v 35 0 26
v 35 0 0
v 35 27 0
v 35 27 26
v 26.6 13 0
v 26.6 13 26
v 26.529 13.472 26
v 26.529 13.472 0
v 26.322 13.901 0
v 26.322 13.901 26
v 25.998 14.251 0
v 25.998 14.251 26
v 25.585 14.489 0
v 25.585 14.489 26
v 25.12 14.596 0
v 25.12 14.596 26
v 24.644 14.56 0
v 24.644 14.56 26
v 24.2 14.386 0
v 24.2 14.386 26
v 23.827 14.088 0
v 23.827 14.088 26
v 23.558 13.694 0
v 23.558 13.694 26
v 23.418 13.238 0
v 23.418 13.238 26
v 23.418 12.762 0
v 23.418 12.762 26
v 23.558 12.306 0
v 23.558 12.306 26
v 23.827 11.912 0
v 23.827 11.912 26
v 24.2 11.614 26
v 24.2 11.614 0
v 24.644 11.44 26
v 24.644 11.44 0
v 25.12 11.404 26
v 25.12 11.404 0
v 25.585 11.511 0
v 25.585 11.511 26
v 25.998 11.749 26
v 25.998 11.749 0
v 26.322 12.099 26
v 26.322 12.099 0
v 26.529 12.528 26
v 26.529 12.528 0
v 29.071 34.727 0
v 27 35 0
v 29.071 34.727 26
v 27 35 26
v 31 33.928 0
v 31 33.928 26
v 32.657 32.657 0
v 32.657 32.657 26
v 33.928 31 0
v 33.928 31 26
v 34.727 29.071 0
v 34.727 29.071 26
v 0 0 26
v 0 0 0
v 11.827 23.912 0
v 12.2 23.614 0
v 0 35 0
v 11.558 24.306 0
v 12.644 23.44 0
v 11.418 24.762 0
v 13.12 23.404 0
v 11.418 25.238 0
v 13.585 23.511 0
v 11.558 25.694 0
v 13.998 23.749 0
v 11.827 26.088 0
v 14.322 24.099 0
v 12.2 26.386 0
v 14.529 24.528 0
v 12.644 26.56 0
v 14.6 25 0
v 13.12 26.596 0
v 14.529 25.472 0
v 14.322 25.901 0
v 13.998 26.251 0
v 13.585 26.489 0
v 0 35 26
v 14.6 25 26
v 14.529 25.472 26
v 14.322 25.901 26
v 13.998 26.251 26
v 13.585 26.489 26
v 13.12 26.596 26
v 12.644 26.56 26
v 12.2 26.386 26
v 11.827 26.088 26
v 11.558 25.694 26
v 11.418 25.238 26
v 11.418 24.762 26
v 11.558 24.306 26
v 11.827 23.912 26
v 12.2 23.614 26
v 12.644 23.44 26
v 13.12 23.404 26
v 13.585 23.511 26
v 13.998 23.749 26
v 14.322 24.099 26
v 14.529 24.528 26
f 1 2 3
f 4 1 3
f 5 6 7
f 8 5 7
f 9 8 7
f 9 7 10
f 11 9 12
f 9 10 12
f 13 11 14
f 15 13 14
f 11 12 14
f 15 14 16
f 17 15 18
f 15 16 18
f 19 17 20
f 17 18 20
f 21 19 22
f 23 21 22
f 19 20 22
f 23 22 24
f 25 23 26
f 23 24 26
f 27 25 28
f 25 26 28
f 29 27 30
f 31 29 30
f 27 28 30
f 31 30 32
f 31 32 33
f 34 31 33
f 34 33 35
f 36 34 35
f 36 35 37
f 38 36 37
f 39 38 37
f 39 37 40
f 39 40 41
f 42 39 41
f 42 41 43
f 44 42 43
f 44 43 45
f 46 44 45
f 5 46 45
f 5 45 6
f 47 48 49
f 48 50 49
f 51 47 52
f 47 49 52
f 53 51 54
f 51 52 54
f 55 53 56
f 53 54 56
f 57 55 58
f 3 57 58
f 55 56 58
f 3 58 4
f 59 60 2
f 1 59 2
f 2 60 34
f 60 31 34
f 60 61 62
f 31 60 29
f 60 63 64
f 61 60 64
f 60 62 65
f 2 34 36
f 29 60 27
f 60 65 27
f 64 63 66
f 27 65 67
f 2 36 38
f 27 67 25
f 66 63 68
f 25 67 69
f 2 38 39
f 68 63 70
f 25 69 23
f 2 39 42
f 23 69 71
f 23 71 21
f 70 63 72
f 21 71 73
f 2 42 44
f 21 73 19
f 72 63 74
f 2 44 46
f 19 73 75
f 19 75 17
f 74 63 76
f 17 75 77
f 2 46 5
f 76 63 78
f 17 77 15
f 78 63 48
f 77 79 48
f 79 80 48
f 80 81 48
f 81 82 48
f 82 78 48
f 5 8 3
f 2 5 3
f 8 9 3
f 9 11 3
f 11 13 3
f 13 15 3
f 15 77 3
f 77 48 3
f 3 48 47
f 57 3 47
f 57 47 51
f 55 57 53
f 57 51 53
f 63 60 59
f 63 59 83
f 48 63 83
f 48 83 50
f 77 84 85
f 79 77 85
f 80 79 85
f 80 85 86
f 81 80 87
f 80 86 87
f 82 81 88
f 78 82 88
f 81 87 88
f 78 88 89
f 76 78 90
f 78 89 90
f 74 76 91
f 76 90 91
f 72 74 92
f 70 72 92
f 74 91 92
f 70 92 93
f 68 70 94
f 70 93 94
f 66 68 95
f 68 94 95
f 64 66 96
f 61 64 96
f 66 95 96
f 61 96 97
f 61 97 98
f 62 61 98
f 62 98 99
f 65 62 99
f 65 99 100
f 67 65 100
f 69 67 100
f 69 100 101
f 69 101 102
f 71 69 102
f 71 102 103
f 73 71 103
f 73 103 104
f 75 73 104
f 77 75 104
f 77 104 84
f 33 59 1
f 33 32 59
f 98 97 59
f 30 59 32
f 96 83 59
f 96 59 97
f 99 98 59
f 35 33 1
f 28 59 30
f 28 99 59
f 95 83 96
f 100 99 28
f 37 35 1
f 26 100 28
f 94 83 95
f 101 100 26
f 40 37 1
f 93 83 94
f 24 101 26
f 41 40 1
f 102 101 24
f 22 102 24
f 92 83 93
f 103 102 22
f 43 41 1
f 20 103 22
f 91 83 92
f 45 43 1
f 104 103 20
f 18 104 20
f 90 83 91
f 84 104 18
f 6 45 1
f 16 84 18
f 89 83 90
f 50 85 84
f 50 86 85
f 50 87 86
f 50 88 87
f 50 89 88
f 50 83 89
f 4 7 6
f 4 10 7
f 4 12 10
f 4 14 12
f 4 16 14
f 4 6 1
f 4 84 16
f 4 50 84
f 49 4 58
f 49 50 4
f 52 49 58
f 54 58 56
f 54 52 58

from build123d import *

# Parameters (mm, degrees)
SKETCH_W     = 35
SKETCH_H     = 35
PAD_DEPTH    = 26
SKETCH001_R  = 1.6
POCKET_DEPTH = 26.001
FILLET_R     = 8


with BuildPart() as part:
    # Sketch → Pad (new body)
    with BuildSketch(Plane.XY):
        with Locations((17.5, 17.5)):
            Rectangle(SKETCH_W, SKETCH_H)
    extrude(amount=PAD_DEPTH)

    # Sketch001 (on Face6 of Pad) → Pocket (cut, through all)
    with BuildSketch(Plane.XY.offset(26)):
        with Locations((25, 13)):
            Circle(SKETCH001_R)
        with Locations((13, 25)):
            Circle(SKETCH001_R)
    extrude(amount=-POCKET_DEPTH, mode=Mode.SUBTRACT)

    # Fillet
    fillet_edges = [part.edges().sort_by_distance(p)[0] for p in [
        (35, 35, 13),
    ]]
    fillet(fillet_edges, radius=FILLET_R)


solid = part.part
